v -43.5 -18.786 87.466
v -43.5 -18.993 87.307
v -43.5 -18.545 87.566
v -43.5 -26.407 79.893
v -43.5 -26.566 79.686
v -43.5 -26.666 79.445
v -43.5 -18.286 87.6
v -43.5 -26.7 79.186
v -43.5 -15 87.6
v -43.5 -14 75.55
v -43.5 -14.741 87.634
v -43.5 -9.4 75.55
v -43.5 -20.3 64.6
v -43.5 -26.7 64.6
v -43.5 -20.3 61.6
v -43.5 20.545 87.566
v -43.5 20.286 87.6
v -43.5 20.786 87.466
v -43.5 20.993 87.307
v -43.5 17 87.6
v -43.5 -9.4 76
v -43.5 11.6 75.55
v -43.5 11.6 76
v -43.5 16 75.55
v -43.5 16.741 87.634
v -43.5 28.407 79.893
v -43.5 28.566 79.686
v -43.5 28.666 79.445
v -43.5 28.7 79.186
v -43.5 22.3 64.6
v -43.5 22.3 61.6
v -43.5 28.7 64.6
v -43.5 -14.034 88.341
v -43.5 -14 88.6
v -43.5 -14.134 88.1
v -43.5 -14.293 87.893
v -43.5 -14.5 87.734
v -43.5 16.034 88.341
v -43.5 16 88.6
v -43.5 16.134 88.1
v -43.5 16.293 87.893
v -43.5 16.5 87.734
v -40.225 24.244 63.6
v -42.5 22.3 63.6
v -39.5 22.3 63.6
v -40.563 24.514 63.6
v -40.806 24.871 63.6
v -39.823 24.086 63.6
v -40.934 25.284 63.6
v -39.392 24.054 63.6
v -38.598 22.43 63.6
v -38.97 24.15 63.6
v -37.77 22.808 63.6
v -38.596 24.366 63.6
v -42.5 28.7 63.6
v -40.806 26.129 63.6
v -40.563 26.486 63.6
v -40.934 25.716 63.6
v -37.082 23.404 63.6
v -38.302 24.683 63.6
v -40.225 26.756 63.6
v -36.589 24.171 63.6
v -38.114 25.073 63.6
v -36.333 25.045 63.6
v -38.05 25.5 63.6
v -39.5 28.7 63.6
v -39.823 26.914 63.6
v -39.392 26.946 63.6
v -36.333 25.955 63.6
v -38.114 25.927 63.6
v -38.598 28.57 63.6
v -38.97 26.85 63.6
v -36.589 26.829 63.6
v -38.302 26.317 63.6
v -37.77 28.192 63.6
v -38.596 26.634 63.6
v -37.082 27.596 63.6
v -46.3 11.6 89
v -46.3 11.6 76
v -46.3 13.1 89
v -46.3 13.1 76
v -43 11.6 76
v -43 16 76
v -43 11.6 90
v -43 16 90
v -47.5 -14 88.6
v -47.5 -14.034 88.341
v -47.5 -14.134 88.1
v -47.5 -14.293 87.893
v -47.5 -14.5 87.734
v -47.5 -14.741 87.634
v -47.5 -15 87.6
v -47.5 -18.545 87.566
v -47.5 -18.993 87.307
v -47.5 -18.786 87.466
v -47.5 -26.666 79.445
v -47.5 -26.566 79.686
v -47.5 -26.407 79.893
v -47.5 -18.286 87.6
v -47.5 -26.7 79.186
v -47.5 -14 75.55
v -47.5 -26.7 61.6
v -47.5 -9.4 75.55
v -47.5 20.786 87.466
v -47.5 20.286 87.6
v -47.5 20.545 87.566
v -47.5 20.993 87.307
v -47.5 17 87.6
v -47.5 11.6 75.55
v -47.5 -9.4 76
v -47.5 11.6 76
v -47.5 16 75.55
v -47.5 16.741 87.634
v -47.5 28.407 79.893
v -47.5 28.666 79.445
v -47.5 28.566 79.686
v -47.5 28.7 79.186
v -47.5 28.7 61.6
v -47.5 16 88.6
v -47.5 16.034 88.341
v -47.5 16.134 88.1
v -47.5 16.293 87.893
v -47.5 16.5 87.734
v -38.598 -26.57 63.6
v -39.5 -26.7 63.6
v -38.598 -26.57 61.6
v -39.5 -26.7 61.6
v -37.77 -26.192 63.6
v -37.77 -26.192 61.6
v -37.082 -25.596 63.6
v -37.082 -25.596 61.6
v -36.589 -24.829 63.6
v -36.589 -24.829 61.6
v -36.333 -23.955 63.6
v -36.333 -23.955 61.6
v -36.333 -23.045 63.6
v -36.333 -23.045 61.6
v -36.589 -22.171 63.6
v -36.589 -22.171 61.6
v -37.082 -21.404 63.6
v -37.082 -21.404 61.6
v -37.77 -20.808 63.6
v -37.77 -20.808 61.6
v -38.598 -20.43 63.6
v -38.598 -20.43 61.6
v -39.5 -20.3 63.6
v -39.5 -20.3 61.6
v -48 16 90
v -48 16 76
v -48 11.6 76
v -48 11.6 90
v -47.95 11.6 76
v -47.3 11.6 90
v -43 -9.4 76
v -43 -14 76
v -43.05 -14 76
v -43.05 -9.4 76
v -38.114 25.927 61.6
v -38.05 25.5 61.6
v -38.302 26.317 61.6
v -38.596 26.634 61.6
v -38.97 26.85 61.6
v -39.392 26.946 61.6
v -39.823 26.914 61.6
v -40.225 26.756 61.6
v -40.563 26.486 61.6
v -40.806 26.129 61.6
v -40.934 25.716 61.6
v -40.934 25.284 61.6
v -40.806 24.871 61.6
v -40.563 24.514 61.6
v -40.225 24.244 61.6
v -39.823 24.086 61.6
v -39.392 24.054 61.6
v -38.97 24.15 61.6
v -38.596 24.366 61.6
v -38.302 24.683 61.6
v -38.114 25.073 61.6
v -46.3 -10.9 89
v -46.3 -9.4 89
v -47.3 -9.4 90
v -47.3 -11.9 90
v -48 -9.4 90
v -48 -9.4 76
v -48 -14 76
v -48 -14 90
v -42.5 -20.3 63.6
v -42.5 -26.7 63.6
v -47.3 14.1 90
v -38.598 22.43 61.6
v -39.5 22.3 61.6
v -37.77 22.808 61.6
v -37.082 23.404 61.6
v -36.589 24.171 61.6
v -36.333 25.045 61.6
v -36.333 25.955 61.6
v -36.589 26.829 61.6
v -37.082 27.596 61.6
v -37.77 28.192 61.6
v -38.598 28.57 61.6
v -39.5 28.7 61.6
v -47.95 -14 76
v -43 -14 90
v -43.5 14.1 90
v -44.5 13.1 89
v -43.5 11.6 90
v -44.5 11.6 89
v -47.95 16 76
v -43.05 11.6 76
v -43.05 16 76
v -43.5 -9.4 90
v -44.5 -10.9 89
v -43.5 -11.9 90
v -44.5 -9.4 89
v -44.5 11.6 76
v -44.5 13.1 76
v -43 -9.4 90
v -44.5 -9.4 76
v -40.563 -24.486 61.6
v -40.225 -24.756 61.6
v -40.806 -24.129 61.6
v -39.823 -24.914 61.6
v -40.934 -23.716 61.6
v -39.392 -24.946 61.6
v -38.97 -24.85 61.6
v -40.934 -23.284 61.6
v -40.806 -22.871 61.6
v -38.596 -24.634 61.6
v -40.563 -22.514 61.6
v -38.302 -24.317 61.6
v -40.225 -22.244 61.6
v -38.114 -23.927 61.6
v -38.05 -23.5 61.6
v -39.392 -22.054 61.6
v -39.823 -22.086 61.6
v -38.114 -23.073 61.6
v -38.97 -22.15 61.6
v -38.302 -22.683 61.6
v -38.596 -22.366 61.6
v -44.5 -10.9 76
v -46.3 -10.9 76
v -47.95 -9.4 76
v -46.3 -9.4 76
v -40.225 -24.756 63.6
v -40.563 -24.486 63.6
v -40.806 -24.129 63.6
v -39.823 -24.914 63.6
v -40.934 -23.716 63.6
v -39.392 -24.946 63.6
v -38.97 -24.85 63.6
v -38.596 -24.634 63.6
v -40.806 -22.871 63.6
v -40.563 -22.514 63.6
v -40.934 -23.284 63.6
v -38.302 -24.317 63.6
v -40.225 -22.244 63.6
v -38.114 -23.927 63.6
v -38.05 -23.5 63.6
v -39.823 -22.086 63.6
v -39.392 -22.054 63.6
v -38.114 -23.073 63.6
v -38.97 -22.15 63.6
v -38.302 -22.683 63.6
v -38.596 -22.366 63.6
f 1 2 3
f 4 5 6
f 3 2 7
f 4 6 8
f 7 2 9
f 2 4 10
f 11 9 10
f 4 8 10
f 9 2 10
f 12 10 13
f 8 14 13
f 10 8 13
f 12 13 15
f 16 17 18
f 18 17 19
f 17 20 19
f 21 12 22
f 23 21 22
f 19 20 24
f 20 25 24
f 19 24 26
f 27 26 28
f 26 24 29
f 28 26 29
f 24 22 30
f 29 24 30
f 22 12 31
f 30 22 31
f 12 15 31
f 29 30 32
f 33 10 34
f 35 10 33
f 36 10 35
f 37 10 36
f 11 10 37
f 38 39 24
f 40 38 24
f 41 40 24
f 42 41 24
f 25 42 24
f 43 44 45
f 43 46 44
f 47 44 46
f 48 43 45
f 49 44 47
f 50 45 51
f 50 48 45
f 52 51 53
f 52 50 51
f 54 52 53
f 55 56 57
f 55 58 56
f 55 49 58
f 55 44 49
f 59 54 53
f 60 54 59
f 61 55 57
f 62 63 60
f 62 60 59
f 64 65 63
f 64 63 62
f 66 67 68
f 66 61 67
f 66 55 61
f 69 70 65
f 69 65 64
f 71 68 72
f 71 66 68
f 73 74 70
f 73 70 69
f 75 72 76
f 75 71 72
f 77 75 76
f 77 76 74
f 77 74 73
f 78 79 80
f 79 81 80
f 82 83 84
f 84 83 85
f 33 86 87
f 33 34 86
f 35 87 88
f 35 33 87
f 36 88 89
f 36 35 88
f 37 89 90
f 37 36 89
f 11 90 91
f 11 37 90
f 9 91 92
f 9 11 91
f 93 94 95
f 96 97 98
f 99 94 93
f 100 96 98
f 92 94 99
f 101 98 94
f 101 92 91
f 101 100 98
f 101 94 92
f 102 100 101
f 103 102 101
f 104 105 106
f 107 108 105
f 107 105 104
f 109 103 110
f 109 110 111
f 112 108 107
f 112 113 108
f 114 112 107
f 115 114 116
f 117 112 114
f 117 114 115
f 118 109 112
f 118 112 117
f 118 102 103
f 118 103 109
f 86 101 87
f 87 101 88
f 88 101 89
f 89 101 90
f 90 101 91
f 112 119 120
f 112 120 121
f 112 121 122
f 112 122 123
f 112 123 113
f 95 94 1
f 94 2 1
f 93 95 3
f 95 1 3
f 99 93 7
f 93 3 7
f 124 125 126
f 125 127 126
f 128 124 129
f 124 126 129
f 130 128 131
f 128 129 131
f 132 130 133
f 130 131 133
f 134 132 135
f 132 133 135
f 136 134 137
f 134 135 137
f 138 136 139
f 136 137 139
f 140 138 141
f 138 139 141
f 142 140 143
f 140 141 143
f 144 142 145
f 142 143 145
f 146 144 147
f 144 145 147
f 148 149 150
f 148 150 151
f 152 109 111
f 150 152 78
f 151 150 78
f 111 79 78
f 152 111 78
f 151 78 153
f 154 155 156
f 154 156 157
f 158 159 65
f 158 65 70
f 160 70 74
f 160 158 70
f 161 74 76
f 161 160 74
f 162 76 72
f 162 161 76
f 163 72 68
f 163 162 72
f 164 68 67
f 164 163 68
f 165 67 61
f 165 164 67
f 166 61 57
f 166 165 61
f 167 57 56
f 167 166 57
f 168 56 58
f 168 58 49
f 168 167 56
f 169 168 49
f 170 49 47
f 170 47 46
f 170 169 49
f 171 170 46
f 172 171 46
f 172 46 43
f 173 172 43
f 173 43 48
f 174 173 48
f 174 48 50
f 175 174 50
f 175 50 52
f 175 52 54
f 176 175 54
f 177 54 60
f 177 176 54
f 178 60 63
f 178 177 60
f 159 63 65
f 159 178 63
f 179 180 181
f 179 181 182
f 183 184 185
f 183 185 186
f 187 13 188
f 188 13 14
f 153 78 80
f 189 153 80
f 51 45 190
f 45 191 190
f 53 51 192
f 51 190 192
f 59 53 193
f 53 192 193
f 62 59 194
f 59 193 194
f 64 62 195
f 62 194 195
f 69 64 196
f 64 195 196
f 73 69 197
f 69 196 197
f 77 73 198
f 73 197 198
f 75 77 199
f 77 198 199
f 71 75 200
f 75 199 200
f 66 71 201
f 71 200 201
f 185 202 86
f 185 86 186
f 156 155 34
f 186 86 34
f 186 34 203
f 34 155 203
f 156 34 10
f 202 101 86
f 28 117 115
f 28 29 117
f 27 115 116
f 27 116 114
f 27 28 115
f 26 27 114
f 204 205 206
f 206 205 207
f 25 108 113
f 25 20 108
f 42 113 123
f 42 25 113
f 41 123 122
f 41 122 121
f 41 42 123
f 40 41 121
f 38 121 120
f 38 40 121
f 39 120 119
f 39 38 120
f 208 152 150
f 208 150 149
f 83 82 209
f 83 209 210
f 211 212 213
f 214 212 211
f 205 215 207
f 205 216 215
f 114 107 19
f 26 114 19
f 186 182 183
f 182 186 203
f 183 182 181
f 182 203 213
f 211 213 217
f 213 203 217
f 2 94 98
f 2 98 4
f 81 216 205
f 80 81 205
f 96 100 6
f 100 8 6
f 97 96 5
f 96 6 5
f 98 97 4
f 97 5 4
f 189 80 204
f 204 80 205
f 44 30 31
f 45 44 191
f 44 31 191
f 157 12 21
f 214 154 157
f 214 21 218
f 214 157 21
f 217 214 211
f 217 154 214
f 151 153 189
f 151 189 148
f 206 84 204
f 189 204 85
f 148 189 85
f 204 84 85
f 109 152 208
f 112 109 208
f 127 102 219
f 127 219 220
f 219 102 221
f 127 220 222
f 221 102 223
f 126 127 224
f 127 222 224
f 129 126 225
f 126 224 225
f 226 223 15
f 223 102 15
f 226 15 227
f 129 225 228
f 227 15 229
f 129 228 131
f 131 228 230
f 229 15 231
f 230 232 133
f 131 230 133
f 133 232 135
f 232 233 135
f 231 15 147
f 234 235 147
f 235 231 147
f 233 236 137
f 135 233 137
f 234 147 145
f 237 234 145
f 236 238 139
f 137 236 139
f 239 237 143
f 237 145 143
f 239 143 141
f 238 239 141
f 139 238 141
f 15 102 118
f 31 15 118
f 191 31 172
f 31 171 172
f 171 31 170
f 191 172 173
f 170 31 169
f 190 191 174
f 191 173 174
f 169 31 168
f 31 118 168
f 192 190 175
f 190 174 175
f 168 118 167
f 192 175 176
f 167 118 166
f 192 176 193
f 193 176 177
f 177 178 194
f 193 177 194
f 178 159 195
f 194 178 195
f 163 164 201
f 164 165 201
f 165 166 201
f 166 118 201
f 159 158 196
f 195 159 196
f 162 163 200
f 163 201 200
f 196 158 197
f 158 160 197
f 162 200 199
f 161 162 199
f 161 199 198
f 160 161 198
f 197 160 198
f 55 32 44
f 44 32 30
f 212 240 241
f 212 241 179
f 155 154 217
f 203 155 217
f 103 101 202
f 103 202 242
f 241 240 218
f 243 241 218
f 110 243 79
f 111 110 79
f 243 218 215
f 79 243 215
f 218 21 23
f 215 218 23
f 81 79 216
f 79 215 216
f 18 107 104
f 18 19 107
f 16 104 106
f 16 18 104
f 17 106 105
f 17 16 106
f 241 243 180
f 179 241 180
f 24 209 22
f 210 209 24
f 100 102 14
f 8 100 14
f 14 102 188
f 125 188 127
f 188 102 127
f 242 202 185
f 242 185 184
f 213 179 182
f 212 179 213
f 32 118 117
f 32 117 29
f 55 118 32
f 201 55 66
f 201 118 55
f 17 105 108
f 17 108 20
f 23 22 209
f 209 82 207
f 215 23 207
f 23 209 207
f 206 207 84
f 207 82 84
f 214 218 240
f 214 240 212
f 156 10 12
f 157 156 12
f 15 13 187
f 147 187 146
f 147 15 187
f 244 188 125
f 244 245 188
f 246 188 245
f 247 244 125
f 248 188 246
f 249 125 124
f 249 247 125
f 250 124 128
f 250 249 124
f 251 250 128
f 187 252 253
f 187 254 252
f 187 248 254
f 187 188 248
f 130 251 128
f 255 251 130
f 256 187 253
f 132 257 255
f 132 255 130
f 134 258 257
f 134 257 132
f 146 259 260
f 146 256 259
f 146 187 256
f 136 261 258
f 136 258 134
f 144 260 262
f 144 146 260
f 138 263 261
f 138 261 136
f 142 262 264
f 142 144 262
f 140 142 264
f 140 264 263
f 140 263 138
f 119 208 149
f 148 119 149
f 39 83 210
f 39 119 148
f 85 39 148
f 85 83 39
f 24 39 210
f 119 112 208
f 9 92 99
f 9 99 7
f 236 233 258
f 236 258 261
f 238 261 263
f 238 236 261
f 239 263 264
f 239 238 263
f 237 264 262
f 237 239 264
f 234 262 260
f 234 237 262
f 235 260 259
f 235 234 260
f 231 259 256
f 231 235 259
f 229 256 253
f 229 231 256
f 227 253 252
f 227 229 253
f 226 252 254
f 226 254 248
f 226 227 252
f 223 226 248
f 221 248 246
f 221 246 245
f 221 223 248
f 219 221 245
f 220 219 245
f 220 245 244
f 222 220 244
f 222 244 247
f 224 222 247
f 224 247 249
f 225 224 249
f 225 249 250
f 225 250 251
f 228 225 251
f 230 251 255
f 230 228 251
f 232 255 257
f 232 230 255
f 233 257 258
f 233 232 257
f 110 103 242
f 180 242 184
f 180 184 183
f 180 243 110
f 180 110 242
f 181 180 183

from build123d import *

# Parameters (mm, degrees)
BOX088_W           = 25
BOX088_H           = 24
BOX088_DEPTH       = 1.8
BOX088_PITCH_ANGLE = -90
BOX089_W           = 25
BOX089_H           = 21
BOX089_DEPTH       = 10
BOX089_PITCH_ANGLE = -90
CYLINDER297_R      = 1.45
CYLINDER297_DEPTH  = 2
BOX085_W           = 8
BOX085_H           = 6.4
BOX085_DEPTH       = 2
CYLINDER298_R      = 3.2
CYLINDER298_DEPTH  = 2
BOX086_W           = 4
BOX086_H           = 55.4
BOX086_DEPTH       = 26
CYLINDER295_R      = 1.45
CYLINDER295_DEPTH  = 2
BOX084_W           = 8
BOX084_H           = 6.4
BOX084_DEPTH       = 2
CYLINDER296_R      = 3.2
CYLINDER296_DEPTH  = 2
CHAMFER_SIZE       = 1
BOX087_W           = 14
BOX087_H           = 30
BOX087_DEPTH       = 5
BOX087_PITCH_ANGLE = -90
CHAMFER001_SIZE    = 8
FILLET_R           = 1
FILLET001_R        = 1
CHAMFER002_SIZE    = 1
CHAMFER003_SIZE    = 1
CHAMFER004_SIZE    = 0.45


with BuildPart() as cubo088:
    # Box088 → Box088 (new body)
    with BuildSketch(Plane.XY):
        with Locations((12.5, 12)):
            Rectangle(BOX088_W, BOX088_H)
    extrude(amount=BOX088_DEPTH)


with BuildPart() as cubo088_1:
    # Box088 pitch: moved
    add(cubo088.part.rotate(Axis((0, 0, 0), (0, 1, 0)), BOX088_PITCH_ANGLE))


with BuildPart() as cubo088_2:
    # Box088 placement: moved
    add(cubo088_1.part.moved(Location((-44, -10.2, 76))))


with BuildPart() as fusion128:
    # Box089 → Box089 (new body)
    with BuildSketch(Plane.XY):
        with Locations((12.5, 10.5)):
            Rectangle(BOX089_W, BOX089_H)
    extrude(amount=BOX089_DEPTH)


with BuildPart() as fusion128_1:
    # Box089 pitch: moved
    add(fusion128.part.rotate(Axis((0, 0, 0), (0, 1, 0)), BOX089_PITCH_ANGLE))


with BuildPart() as fusion128_2:
    # Box089 placement: moved
    add(fusion128_1.part.moved(Location((-41, -8.7, 76))))

    # Fusion128: union Cubo088
    add(cubo088_2.part)


with BuildPart() as fusion128_3:
    # Fusion128 placement: moved
    add(fusion128_2.part.moved(Location((-0.5, -0.7, 0))))


with BuildPart() as cilindro297:
    # Cylinder297 → Cylinder297 (new body)
    with BuildSketch(Plane.XY):
        Circle(CYLINDER297_R)
    extrude(amount=CYLINDER297_DEPTH)


with BuildPart() as cubo085:
    # Box085 → Box085 (new body)
    with BuildSketch(Plane(origin=(-8, -3.2, 0), x_dir=(1, 0, 0), z_dir=(0, 0, 1))):
        with Locations((4, 3.2)):
            Rectangle(BOX085_W, BOX085_H)
    extrude(amount=BOX085_DEPTH)


with BuildPart() as cut009:
    # Cylinder298 → Cylinder298 (new body)
    with BuildSketch(Plane.XY):
        Circle(CYLINDER298_R)
    extrude(amount=CYLINDER298_DEPTH)

    # Fusion126: union Cubo085
    add(cubo085.part)

    # Cut009: cut Cilindro297
    add(cilindro297.part, mode=Mode.SUBTRACT)


with BuildPart() as cut009_1:
    # Cut009 placement: moved
    add(cut009.part.moved(Location((-39.5, 25.5, 61.6))))


with BuildPart() as cubo086:
    # Box086 → Box086 (new body)
    with BuildSketch(Plane(origin=(-47.5, -26.7, 61.6), x_dir=(1, 0, 0), z_dir=(0, 0, 1))):
        with Locations((2, 27.7)):
            Rectangle(BOX086_W, BOX086_H)
    extrude(amount=BOX086_DEPTH)


with BuildPart() as cilindro295:
    # Cylinder295 → Cylinder295 (new body)
    with BuildSketch(Plane.XY):
        Circle(CYLINDER295_R)
    extrude(amount=CYLINDER295_DEPTH)


with BuildPart() as cubo084:
    # Box084 → Box084 (new body)
    with BuildSketch(Plane(origin=(-8, -3.2, 0), x_dir=(1, 0, 0), z_dir=(0, 0, 1))):
        with Locations((4, 3.2)):
            Rectangle(BOX084_W, BOX084_H)
    extrude(amount=BOX084_DEPTH)


with BuildPart() as chamfer_body:
    # Cylinder296 → Cylinder296 (new body)
    with BuildSketch(Plane.XY):
        Circle(CYLINDER296_R)
    extrude(amount=CYLINDER296_DEPTH)

    # Fusion125: union Cubo084
    add(cubo084.part)

    # Cut008: cut Cilindro295
    add(cilindro295.part, mode=Mode.SUBTRACT)


with BuildPart() as chamfer_body_1:
    # Cut008 placement: moved
    add(chamfer_body.part.moved(Location((-39.5, -23.5, 61.6))))

    # Fusion127: union Cut009, Cubo086
    add(cut009_1.part)
    add(cubo086.part)

    # Chamfer
    chamfer_edges = [chamfer_body_1.edges().sort_by_distance(p)[0] for p in [
        (-43.5, 25.5, 63.6),
        (-43.5, -23.5, 63.6),
    ]]
    chamfer(chamfer_edges, length=CHAMFER_SIZE)


with BuildPart() as chamfer004:
    # Box087 → Box087 (new body)
    with BuildSketch(Plane.XY):
        with Locations((7, 15)):
            Rectangle(BOX087_W, BOX087_H)
    extrude(amount=BOX087_DEPTH)


with BuildPart() as chamfer004_1:
    # Box087 pitch: moved
    add(chamfer004.part.rotate(Axis((0, 0, 0), (0, 1, 0)), BOX087_PITCH_ANGLE))


with BuildPart() as chamfer004_2:
    # Box087 placement: moved
    add(chamfer004_1.part.moved(Location((-43, -14, 76))))

    # Fusion129: union Chamfer body
    add(chamfer_body_1.part)

    # Cut010: cut Fusion128
    add(fusion128_3.part, mode=Mode.SUBTRACT)

    # Chamfer001
    chamfer001_edges = [chamfer004_2.edges().sort_by_distance(p)[0] for p in [
        (-45.5, -26.7, 87.6),
        (-45.5, 28.7, 87.6),
    ]]
    chamfer(chamfer001_edges, length=CHAMFER001_SIZE)

    # Fillet
    fillet_edges = [chamfer004_2.edges().sort_by_distance(p)[0] for p in [
        (-45.5, -26.7, 79.6),
        (-45.5, -18.7, 87.6),
        (-45.5, 20.7, 87.6),
        (-45.5, 28.7, 79.6),
    ]]
    fillet(fillet_edges, radius=FILLET_R)

    # Fillet001
    fillet001_edges = [chamfer004_2.edges().sort_by_distance(p)[0] for p in [
        (-45.5, -14, 87.6),
        (-45.5, 16, 87.6),
    ]]
    fillet(fillet001_edges, radius=FILLET001_R)

    # Chamfer002
    chamfer002_edges = [chamfer004_2.edges().sort_by_distance(p)[0] for p in [
        (-45.4, -10.9, 90),
        (-45.4, 13.1, 90),
    ]]
    chamfer(chamfer002_edges, length=CHAMFER002_SIZE)

    # Chamfer003
    chamfer003_edges = [chamfer004_2.edges().sort_by_distance(p)[0] for p in [
        (-44.5, -10.15, 90),
        (-46.3, -10.15, 90),
        (-44.5, 12.35, 90),
        (-46.3, 12.35, 90),
    ]]
    chamfer(chamfer003_edges, length=CHAMFER003_SIZE)

    # Chamfer004
    chamfer004_edges = [chamfer004_2.edges().sort_by_distance(p)[0] for p in [
        (-43.5, -11.7, 76),
        (-47.5, -11.7, 76),
        (-47.5, 13.8, 76),
        (-43.5, 13.8, 76),
    ]]
    chamfer(chamfer004_edges, length=CHAMFER004_SIZE)


solid = chamfer004_2.part
